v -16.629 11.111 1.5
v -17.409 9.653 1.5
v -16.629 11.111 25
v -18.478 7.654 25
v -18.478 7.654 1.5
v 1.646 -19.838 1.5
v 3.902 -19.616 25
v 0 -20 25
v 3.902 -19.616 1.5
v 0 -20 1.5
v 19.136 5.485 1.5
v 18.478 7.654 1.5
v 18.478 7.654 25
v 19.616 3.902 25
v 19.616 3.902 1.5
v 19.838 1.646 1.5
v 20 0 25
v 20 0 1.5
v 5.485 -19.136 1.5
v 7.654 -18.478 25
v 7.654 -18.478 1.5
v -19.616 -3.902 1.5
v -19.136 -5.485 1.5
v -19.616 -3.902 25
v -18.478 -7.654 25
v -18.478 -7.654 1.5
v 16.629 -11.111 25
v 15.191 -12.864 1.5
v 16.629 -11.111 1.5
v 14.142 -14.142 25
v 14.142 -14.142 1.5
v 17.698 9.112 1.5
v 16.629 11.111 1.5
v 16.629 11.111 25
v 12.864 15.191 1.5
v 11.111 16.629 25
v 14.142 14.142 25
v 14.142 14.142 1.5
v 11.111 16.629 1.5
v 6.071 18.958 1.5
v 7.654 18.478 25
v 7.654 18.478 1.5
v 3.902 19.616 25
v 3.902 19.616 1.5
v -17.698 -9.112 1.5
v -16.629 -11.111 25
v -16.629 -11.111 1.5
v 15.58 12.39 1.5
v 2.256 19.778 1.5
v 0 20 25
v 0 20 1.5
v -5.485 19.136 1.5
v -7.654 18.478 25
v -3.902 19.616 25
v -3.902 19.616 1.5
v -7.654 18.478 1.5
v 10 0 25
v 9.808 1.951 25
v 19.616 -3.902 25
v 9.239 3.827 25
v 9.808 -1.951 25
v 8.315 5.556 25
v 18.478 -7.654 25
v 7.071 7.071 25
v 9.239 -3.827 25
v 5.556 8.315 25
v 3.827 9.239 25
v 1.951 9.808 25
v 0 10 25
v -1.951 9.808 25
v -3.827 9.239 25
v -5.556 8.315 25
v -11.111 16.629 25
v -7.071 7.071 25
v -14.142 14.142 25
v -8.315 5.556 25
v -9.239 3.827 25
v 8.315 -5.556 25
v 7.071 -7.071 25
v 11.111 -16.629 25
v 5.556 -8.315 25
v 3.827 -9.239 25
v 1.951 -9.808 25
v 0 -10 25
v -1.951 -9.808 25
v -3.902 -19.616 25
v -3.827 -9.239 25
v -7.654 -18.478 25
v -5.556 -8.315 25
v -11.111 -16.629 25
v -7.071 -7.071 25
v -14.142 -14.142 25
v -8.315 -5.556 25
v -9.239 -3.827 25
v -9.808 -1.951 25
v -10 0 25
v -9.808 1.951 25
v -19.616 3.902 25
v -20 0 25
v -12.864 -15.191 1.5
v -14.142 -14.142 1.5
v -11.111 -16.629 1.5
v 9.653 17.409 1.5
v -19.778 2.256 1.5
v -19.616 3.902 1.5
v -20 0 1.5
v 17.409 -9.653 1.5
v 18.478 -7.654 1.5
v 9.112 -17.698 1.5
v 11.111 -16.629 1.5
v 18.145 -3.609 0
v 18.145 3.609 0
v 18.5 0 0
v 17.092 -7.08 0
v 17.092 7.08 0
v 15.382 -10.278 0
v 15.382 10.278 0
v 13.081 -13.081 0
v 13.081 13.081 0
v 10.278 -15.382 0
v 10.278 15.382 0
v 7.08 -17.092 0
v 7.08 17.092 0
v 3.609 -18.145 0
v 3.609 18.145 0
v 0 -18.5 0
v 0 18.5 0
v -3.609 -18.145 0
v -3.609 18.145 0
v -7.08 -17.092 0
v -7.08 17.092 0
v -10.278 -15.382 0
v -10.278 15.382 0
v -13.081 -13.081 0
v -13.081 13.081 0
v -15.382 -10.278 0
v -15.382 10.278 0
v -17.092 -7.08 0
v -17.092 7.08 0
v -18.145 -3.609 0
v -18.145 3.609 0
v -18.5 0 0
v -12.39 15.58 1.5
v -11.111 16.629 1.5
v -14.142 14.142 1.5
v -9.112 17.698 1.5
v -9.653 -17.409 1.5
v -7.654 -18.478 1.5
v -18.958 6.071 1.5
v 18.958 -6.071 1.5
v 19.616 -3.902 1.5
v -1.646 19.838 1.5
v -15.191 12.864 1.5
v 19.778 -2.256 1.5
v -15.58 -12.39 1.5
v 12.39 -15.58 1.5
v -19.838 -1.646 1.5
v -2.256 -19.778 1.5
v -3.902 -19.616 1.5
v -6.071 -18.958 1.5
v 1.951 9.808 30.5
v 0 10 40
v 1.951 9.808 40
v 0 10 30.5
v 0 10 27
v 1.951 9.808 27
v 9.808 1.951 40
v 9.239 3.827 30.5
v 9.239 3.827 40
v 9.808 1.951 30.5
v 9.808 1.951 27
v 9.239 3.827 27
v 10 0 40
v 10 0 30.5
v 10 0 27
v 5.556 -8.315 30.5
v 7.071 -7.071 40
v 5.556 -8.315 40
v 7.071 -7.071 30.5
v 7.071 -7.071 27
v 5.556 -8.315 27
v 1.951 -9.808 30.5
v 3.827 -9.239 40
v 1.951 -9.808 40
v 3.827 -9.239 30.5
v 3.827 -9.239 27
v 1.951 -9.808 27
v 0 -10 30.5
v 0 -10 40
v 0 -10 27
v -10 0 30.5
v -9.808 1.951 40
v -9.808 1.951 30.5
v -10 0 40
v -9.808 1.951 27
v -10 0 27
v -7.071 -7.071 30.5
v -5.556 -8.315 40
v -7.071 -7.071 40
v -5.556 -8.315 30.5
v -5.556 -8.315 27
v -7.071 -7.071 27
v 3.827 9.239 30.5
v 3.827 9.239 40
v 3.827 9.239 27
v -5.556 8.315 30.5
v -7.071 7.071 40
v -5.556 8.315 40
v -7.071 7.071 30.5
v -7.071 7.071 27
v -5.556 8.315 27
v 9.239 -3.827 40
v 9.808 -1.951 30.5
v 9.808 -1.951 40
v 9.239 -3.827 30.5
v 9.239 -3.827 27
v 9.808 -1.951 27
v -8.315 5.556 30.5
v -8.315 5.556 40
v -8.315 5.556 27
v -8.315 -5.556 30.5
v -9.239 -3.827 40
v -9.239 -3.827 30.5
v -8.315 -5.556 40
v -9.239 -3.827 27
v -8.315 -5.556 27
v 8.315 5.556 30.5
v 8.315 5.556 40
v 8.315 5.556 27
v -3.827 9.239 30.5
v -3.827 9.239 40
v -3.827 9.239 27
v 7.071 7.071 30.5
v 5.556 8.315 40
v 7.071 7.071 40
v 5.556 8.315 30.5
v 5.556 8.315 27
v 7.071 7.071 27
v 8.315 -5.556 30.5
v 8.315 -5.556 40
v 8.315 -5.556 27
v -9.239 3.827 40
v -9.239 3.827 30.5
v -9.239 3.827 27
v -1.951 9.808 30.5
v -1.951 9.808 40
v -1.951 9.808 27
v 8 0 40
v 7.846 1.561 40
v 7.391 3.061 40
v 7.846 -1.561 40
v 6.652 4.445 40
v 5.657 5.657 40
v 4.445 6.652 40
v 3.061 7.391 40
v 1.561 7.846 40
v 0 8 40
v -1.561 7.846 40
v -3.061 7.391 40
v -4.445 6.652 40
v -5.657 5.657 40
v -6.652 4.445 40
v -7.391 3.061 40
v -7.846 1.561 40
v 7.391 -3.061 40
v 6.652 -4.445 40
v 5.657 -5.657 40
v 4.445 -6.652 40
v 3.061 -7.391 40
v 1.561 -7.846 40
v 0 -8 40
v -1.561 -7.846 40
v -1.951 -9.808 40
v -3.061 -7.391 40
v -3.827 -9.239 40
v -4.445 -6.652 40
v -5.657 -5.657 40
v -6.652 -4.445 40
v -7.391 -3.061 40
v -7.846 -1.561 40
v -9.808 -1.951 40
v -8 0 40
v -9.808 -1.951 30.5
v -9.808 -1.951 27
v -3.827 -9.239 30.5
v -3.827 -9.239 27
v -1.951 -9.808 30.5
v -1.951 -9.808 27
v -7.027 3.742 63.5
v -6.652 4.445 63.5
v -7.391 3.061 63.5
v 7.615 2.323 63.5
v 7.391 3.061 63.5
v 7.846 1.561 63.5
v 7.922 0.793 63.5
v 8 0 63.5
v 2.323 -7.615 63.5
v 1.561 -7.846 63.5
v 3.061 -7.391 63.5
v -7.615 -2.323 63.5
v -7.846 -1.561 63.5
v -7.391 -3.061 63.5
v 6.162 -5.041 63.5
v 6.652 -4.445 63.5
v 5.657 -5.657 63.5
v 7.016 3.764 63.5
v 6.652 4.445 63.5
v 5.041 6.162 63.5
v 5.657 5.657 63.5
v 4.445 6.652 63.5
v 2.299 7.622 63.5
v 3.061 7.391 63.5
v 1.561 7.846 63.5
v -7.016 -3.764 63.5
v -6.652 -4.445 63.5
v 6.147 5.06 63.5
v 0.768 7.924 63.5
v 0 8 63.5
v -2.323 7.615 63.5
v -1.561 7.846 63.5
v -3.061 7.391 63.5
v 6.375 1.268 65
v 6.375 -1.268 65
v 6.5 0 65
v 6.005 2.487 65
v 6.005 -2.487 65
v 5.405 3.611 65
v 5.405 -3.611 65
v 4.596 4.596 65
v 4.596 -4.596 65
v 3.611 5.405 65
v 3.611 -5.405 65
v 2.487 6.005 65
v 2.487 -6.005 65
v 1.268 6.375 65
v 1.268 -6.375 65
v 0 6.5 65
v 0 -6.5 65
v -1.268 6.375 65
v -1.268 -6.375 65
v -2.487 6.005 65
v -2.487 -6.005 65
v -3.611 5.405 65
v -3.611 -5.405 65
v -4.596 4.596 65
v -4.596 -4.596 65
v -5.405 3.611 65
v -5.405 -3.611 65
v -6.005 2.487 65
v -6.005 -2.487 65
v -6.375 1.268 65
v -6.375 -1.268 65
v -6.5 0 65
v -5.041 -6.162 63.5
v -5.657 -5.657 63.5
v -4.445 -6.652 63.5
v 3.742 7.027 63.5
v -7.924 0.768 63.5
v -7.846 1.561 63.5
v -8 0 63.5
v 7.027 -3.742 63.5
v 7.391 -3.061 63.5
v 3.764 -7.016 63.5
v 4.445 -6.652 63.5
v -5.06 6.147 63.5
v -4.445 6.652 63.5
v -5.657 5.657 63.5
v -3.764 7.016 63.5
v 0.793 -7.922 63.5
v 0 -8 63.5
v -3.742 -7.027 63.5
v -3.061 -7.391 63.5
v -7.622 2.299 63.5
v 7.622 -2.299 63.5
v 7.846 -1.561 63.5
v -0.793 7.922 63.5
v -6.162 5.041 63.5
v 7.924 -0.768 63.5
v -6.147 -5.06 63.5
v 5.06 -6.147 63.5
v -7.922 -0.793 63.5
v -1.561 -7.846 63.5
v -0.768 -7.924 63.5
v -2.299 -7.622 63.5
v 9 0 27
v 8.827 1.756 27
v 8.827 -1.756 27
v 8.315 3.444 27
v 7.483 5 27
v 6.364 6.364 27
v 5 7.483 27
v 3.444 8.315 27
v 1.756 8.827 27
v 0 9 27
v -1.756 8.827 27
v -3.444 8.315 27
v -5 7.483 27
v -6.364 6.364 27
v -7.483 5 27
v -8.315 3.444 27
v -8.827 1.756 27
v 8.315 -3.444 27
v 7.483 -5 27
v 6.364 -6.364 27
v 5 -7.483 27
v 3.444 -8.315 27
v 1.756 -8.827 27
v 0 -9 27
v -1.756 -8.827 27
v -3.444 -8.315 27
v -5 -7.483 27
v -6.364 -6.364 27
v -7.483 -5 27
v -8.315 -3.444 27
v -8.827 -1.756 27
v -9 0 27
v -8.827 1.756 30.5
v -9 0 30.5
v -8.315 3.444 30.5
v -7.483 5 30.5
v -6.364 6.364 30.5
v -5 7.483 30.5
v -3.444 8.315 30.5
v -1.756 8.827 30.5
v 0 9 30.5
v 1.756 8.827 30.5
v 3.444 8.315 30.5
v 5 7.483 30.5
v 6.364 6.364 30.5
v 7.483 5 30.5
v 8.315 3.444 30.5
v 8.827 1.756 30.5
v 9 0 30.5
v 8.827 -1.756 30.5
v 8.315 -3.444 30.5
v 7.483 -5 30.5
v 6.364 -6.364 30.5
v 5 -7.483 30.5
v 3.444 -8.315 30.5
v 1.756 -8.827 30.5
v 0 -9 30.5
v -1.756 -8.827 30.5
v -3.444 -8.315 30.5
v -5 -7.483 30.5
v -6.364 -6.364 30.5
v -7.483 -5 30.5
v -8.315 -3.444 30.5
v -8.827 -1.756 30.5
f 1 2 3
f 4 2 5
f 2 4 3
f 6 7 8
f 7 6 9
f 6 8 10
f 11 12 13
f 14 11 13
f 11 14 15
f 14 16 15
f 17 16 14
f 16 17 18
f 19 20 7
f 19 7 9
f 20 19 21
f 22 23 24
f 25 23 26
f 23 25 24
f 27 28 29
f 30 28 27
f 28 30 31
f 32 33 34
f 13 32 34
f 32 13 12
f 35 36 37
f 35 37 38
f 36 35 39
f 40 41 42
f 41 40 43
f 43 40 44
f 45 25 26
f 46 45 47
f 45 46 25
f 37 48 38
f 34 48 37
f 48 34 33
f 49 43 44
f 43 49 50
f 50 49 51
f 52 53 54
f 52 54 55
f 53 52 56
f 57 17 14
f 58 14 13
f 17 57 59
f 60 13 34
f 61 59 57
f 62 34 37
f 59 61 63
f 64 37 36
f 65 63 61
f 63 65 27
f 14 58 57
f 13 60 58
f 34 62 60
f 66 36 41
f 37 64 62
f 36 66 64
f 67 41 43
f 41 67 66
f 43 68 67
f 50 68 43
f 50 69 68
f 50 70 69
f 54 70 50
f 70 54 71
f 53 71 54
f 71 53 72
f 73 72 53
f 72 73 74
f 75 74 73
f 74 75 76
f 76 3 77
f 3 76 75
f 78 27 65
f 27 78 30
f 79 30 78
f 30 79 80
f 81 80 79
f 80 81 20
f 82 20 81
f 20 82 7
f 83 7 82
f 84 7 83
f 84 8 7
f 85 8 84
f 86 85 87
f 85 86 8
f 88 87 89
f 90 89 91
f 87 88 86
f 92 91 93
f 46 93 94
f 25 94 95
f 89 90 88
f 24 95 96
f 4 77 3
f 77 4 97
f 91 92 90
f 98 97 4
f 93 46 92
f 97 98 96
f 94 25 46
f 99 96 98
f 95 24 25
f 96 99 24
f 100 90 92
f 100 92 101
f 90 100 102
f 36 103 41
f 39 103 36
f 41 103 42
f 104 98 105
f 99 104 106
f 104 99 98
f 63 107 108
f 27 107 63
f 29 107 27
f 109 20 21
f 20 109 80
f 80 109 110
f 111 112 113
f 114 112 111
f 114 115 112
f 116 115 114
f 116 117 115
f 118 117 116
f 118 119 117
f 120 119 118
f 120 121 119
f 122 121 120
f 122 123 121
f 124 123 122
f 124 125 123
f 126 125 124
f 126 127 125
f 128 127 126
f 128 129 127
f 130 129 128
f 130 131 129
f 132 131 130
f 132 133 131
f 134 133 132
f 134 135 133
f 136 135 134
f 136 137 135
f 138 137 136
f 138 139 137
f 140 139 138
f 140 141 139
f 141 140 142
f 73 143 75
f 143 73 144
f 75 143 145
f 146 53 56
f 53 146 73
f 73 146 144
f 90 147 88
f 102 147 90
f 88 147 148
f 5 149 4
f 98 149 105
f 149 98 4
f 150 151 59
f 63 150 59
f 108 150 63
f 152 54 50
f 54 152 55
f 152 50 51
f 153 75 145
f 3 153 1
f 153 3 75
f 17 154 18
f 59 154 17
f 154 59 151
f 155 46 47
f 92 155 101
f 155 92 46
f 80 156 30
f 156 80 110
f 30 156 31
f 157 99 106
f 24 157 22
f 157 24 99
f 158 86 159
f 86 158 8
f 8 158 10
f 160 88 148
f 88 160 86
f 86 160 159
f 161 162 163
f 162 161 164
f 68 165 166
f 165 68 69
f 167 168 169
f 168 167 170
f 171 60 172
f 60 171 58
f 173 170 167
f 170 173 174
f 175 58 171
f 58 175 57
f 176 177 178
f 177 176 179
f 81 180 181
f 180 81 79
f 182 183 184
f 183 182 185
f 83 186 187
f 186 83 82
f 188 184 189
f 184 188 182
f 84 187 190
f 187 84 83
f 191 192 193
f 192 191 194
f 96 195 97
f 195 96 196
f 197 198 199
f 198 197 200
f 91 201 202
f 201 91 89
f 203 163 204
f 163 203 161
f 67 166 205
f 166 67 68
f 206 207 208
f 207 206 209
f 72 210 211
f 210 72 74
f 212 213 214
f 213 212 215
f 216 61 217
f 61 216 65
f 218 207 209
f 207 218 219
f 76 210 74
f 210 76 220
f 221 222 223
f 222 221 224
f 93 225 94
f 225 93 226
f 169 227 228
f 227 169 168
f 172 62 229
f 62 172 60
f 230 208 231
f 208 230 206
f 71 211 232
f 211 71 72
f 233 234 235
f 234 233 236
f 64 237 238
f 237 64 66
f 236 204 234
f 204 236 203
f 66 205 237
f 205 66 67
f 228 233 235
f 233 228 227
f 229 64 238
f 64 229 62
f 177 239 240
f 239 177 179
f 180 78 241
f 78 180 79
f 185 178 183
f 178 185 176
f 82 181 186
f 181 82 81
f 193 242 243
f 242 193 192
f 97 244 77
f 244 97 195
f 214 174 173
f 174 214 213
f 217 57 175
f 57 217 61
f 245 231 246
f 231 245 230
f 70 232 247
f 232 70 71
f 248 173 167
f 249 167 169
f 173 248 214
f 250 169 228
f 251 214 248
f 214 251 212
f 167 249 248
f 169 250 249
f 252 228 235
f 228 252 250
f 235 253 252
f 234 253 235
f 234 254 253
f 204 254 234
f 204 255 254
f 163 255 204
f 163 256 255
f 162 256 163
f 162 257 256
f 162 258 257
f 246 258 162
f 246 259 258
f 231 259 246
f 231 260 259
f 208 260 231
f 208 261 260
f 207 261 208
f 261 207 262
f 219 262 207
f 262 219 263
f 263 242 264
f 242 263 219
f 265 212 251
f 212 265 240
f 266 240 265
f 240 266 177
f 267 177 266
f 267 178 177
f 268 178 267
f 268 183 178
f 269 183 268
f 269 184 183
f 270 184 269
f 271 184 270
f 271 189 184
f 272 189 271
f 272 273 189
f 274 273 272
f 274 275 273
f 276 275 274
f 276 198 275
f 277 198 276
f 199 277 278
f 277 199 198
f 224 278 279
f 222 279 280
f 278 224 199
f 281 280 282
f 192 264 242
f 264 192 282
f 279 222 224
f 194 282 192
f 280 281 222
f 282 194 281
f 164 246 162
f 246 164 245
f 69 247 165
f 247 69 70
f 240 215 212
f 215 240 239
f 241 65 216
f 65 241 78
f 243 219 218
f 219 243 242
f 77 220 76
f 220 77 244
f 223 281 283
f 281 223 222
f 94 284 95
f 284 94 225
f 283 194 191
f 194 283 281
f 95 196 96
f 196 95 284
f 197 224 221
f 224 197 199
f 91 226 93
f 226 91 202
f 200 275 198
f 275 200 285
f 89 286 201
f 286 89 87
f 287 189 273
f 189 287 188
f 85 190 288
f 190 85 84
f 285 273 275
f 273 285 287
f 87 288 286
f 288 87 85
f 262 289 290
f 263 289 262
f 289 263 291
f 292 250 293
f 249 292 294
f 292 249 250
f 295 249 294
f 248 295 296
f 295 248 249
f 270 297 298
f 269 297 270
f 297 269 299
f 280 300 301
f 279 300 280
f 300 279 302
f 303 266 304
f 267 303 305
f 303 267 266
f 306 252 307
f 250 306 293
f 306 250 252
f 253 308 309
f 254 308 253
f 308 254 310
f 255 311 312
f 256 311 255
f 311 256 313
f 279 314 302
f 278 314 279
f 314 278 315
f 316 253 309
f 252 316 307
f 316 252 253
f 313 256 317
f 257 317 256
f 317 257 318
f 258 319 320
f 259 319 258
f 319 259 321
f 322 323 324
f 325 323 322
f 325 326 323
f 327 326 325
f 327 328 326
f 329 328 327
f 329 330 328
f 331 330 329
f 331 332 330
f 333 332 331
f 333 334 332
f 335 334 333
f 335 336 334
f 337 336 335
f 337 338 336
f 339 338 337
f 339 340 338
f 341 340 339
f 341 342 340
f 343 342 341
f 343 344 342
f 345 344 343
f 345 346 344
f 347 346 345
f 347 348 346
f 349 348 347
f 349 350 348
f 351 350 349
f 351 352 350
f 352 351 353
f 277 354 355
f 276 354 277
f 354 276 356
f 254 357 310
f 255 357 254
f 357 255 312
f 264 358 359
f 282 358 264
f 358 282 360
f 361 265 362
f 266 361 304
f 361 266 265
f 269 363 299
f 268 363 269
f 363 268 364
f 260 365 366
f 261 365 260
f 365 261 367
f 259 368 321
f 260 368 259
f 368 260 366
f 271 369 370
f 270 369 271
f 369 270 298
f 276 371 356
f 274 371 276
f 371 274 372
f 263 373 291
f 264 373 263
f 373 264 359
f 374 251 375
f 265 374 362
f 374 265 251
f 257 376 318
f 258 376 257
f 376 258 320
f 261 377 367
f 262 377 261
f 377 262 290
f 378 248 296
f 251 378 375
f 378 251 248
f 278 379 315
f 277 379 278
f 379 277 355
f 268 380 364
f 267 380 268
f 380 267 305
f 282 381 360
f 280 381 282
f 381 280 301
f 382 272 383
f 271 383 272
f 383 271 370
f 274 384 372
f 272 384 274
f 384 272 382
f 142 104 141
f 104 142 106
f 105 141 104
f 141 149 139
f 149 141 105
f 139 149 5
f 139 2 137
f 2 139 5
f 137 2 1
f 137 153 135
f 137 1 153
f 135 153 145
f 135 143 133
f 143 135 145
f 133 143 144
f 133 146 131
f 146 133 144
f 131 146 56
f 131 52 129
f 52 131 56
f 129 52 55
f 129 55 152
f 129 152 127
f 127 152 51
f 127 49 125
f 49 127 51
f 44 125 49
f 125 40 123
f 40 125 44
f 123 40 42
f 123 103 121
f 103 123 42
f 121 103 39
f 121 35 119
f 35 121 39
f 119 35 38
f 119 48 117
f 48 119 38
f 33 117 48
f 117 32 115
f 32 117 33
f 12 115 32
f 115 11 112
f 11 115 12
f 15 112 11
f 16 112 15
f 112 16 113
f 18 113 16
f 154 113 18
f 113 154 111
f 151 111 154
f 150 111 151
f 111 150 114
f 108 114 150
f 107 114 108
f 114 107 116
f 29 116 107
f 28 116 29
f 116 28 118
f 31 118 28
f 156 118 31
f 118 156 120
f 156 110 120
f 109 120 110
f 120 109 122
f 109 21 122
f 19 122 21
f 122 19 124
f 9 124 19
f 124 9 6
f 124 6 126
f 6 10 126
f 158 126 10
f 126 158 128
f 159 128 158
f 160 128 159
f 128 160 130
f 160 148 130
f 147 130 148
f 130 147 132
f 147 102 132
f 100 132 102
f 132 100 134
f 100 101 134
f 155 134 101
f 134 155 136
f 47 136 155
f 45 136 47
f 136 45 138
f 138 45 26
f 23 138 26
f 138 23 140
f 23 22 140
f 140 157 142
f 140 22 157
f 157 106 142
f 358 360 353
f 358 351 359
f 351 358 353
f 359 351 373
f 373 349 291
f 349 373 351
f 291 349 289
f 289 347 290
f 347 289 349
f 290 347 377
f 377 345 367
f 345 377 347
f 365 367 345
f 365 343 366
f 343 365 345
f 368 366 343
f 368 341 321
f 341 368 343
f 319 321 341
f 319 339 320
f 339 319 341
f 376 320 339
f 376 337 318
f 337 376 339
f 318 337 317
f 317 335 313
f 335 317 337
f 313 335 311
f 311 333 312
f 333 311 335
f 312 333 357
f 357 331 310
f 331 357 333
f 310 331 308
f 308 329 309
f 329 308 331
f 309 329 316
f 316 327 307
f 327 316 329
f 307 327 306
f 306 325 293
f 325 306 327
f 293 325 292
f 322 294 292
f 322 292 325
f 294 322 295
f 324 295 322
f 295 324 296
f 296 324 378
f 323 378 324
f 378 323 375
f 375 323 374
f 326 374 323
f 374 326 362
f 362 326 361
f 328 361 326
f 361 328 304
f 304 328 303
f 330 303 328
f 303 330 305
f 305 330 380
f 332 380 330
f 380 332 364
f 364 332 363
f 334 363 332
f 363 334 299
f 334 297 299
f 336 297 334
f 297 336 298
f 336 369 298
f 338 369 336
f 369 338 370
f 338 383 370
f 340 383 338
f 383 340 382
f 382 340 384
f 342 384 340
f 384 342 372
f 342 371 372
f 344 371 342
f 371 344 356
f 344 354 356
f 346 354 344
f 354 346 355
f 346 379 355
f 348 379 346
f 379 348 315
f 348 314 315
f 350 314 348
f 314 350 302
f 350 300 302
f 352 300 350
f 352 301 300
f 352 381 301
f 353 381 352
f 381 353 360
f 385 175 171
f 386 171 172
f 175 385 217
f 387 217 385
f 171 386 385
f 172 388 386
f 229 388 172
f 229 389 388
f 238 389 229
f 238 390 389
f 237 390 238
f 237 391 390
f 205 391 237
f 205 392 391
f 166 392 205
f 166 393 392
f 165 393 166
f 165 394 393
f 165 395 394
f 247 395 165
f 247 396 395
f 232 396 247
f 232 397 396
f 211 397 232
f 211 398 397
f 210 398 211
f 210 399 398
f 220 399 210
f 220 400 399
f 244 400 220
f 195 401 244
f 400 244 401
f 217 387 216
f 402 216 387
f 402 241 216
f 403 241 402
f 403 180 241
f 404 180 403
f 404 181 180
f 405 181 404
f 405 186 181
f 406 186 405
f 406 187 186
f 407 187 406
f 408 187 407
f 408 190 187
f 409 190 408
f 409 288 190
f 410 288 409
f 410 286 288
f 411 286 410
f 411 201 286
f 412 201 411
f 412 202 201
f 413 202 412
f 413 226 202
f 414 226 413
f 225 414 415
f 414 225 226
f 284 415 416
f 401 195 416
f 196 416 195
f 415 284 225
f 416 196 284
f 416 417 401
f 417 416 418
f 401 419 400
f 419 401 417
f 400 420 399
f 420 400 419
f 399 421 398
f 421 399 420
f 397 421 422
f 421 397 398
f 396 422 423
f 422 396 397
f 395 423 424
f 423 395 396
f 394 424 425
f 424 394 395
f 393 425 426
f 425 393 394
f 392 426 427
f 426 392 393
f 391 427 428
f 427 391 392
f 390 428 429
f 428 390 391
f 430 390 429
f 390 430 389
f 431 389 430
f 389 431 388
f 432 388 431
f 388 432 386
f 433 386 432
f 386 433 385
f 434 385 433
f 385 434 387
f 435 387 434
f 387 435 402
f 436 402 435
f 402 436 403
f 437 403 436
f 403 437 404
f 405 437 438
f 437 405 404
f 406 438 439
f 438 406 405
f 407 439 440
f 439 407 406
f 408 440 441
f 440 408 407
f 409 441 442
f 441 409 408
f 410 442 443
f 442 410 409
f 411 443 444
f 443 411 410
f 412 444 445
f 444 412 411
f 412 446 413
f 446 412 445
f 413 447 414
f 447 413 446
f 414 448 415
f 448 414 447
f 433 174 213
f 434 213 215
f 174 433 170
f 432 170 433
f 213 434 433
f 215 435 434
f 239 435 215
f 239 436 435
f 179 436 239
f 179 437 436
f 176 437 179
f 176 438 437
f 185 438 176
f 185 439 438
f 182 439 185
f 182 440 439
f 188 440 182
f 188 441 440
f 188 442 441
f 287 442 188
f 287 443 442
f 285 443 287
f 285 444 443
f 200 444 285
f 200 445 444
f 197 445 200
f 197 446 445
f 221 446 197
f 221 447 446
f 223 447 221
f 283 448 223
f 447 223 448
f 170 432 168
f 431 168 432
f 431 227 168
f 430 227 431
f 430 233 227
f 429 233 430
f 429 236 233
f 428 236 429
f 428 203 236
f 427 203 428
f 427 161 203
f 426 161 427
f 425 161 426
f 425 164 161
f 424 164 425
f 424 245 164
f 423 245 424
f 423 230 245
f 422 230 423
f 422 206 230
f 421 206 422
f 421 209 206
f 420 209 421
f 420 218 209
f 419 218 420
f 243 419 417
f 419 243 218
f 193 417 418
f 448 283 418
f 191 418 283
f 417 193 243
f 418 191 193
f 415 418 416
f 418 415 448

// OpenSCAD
$fn = 32;

// ----------------------------------------------------------------------
// Stepped shaft: diameters 40, 20, 16 mm, 65 mm long
// ----------------------------------------------------------------------

// --- parameters (mm) ---
d1 = 40;                  // step 1 diameter
len1 = 25;                // step 1 length
d2 = 20;                  // step 2 diameter
len2 = 15;                // step 2 length
d3 = 16;                  // step 3 diameter
len3 = 25;                // step 3 length
total = 65;               // overall length
chamfer = 1.5;            // end chamfer
groove_r = 10;            // groove radius
groove_z = 27;            // groove position from the end
groove_w = 3.5;           // groove width
groove_d = 1;             // groove depth

difference() {
  /* turned body: stacked cylinders, every step sunk into the bigger one */
  union() {
    cylinder(h = len1, d = d1);
    translate([0, 0, 24.6]) cylinder(h = 15.4, d = d2);
    translate([0, 0, 39.6]) cylinder(h = 25.4, d = d3);
  }
  /* bottom chamfer ring cut */
  rotate_extrude() translate([18.5, -2.5]) polygon([[0, 0], [4, 0], [4, 6.5], [0, 2.5]]);
  /* top chamfer ring cut */
  rotate_extrude() translate([6.5, 65]) polygon([[0, 0], [4, -4], [4, 2.5], [0, 2.5]]);
  /* circlip groove just behind the shoulder */
  rotate_extrude() translate([groove_r - groove_d, groove_z]) square([groove_d + 2.5, groove_w]);
}
